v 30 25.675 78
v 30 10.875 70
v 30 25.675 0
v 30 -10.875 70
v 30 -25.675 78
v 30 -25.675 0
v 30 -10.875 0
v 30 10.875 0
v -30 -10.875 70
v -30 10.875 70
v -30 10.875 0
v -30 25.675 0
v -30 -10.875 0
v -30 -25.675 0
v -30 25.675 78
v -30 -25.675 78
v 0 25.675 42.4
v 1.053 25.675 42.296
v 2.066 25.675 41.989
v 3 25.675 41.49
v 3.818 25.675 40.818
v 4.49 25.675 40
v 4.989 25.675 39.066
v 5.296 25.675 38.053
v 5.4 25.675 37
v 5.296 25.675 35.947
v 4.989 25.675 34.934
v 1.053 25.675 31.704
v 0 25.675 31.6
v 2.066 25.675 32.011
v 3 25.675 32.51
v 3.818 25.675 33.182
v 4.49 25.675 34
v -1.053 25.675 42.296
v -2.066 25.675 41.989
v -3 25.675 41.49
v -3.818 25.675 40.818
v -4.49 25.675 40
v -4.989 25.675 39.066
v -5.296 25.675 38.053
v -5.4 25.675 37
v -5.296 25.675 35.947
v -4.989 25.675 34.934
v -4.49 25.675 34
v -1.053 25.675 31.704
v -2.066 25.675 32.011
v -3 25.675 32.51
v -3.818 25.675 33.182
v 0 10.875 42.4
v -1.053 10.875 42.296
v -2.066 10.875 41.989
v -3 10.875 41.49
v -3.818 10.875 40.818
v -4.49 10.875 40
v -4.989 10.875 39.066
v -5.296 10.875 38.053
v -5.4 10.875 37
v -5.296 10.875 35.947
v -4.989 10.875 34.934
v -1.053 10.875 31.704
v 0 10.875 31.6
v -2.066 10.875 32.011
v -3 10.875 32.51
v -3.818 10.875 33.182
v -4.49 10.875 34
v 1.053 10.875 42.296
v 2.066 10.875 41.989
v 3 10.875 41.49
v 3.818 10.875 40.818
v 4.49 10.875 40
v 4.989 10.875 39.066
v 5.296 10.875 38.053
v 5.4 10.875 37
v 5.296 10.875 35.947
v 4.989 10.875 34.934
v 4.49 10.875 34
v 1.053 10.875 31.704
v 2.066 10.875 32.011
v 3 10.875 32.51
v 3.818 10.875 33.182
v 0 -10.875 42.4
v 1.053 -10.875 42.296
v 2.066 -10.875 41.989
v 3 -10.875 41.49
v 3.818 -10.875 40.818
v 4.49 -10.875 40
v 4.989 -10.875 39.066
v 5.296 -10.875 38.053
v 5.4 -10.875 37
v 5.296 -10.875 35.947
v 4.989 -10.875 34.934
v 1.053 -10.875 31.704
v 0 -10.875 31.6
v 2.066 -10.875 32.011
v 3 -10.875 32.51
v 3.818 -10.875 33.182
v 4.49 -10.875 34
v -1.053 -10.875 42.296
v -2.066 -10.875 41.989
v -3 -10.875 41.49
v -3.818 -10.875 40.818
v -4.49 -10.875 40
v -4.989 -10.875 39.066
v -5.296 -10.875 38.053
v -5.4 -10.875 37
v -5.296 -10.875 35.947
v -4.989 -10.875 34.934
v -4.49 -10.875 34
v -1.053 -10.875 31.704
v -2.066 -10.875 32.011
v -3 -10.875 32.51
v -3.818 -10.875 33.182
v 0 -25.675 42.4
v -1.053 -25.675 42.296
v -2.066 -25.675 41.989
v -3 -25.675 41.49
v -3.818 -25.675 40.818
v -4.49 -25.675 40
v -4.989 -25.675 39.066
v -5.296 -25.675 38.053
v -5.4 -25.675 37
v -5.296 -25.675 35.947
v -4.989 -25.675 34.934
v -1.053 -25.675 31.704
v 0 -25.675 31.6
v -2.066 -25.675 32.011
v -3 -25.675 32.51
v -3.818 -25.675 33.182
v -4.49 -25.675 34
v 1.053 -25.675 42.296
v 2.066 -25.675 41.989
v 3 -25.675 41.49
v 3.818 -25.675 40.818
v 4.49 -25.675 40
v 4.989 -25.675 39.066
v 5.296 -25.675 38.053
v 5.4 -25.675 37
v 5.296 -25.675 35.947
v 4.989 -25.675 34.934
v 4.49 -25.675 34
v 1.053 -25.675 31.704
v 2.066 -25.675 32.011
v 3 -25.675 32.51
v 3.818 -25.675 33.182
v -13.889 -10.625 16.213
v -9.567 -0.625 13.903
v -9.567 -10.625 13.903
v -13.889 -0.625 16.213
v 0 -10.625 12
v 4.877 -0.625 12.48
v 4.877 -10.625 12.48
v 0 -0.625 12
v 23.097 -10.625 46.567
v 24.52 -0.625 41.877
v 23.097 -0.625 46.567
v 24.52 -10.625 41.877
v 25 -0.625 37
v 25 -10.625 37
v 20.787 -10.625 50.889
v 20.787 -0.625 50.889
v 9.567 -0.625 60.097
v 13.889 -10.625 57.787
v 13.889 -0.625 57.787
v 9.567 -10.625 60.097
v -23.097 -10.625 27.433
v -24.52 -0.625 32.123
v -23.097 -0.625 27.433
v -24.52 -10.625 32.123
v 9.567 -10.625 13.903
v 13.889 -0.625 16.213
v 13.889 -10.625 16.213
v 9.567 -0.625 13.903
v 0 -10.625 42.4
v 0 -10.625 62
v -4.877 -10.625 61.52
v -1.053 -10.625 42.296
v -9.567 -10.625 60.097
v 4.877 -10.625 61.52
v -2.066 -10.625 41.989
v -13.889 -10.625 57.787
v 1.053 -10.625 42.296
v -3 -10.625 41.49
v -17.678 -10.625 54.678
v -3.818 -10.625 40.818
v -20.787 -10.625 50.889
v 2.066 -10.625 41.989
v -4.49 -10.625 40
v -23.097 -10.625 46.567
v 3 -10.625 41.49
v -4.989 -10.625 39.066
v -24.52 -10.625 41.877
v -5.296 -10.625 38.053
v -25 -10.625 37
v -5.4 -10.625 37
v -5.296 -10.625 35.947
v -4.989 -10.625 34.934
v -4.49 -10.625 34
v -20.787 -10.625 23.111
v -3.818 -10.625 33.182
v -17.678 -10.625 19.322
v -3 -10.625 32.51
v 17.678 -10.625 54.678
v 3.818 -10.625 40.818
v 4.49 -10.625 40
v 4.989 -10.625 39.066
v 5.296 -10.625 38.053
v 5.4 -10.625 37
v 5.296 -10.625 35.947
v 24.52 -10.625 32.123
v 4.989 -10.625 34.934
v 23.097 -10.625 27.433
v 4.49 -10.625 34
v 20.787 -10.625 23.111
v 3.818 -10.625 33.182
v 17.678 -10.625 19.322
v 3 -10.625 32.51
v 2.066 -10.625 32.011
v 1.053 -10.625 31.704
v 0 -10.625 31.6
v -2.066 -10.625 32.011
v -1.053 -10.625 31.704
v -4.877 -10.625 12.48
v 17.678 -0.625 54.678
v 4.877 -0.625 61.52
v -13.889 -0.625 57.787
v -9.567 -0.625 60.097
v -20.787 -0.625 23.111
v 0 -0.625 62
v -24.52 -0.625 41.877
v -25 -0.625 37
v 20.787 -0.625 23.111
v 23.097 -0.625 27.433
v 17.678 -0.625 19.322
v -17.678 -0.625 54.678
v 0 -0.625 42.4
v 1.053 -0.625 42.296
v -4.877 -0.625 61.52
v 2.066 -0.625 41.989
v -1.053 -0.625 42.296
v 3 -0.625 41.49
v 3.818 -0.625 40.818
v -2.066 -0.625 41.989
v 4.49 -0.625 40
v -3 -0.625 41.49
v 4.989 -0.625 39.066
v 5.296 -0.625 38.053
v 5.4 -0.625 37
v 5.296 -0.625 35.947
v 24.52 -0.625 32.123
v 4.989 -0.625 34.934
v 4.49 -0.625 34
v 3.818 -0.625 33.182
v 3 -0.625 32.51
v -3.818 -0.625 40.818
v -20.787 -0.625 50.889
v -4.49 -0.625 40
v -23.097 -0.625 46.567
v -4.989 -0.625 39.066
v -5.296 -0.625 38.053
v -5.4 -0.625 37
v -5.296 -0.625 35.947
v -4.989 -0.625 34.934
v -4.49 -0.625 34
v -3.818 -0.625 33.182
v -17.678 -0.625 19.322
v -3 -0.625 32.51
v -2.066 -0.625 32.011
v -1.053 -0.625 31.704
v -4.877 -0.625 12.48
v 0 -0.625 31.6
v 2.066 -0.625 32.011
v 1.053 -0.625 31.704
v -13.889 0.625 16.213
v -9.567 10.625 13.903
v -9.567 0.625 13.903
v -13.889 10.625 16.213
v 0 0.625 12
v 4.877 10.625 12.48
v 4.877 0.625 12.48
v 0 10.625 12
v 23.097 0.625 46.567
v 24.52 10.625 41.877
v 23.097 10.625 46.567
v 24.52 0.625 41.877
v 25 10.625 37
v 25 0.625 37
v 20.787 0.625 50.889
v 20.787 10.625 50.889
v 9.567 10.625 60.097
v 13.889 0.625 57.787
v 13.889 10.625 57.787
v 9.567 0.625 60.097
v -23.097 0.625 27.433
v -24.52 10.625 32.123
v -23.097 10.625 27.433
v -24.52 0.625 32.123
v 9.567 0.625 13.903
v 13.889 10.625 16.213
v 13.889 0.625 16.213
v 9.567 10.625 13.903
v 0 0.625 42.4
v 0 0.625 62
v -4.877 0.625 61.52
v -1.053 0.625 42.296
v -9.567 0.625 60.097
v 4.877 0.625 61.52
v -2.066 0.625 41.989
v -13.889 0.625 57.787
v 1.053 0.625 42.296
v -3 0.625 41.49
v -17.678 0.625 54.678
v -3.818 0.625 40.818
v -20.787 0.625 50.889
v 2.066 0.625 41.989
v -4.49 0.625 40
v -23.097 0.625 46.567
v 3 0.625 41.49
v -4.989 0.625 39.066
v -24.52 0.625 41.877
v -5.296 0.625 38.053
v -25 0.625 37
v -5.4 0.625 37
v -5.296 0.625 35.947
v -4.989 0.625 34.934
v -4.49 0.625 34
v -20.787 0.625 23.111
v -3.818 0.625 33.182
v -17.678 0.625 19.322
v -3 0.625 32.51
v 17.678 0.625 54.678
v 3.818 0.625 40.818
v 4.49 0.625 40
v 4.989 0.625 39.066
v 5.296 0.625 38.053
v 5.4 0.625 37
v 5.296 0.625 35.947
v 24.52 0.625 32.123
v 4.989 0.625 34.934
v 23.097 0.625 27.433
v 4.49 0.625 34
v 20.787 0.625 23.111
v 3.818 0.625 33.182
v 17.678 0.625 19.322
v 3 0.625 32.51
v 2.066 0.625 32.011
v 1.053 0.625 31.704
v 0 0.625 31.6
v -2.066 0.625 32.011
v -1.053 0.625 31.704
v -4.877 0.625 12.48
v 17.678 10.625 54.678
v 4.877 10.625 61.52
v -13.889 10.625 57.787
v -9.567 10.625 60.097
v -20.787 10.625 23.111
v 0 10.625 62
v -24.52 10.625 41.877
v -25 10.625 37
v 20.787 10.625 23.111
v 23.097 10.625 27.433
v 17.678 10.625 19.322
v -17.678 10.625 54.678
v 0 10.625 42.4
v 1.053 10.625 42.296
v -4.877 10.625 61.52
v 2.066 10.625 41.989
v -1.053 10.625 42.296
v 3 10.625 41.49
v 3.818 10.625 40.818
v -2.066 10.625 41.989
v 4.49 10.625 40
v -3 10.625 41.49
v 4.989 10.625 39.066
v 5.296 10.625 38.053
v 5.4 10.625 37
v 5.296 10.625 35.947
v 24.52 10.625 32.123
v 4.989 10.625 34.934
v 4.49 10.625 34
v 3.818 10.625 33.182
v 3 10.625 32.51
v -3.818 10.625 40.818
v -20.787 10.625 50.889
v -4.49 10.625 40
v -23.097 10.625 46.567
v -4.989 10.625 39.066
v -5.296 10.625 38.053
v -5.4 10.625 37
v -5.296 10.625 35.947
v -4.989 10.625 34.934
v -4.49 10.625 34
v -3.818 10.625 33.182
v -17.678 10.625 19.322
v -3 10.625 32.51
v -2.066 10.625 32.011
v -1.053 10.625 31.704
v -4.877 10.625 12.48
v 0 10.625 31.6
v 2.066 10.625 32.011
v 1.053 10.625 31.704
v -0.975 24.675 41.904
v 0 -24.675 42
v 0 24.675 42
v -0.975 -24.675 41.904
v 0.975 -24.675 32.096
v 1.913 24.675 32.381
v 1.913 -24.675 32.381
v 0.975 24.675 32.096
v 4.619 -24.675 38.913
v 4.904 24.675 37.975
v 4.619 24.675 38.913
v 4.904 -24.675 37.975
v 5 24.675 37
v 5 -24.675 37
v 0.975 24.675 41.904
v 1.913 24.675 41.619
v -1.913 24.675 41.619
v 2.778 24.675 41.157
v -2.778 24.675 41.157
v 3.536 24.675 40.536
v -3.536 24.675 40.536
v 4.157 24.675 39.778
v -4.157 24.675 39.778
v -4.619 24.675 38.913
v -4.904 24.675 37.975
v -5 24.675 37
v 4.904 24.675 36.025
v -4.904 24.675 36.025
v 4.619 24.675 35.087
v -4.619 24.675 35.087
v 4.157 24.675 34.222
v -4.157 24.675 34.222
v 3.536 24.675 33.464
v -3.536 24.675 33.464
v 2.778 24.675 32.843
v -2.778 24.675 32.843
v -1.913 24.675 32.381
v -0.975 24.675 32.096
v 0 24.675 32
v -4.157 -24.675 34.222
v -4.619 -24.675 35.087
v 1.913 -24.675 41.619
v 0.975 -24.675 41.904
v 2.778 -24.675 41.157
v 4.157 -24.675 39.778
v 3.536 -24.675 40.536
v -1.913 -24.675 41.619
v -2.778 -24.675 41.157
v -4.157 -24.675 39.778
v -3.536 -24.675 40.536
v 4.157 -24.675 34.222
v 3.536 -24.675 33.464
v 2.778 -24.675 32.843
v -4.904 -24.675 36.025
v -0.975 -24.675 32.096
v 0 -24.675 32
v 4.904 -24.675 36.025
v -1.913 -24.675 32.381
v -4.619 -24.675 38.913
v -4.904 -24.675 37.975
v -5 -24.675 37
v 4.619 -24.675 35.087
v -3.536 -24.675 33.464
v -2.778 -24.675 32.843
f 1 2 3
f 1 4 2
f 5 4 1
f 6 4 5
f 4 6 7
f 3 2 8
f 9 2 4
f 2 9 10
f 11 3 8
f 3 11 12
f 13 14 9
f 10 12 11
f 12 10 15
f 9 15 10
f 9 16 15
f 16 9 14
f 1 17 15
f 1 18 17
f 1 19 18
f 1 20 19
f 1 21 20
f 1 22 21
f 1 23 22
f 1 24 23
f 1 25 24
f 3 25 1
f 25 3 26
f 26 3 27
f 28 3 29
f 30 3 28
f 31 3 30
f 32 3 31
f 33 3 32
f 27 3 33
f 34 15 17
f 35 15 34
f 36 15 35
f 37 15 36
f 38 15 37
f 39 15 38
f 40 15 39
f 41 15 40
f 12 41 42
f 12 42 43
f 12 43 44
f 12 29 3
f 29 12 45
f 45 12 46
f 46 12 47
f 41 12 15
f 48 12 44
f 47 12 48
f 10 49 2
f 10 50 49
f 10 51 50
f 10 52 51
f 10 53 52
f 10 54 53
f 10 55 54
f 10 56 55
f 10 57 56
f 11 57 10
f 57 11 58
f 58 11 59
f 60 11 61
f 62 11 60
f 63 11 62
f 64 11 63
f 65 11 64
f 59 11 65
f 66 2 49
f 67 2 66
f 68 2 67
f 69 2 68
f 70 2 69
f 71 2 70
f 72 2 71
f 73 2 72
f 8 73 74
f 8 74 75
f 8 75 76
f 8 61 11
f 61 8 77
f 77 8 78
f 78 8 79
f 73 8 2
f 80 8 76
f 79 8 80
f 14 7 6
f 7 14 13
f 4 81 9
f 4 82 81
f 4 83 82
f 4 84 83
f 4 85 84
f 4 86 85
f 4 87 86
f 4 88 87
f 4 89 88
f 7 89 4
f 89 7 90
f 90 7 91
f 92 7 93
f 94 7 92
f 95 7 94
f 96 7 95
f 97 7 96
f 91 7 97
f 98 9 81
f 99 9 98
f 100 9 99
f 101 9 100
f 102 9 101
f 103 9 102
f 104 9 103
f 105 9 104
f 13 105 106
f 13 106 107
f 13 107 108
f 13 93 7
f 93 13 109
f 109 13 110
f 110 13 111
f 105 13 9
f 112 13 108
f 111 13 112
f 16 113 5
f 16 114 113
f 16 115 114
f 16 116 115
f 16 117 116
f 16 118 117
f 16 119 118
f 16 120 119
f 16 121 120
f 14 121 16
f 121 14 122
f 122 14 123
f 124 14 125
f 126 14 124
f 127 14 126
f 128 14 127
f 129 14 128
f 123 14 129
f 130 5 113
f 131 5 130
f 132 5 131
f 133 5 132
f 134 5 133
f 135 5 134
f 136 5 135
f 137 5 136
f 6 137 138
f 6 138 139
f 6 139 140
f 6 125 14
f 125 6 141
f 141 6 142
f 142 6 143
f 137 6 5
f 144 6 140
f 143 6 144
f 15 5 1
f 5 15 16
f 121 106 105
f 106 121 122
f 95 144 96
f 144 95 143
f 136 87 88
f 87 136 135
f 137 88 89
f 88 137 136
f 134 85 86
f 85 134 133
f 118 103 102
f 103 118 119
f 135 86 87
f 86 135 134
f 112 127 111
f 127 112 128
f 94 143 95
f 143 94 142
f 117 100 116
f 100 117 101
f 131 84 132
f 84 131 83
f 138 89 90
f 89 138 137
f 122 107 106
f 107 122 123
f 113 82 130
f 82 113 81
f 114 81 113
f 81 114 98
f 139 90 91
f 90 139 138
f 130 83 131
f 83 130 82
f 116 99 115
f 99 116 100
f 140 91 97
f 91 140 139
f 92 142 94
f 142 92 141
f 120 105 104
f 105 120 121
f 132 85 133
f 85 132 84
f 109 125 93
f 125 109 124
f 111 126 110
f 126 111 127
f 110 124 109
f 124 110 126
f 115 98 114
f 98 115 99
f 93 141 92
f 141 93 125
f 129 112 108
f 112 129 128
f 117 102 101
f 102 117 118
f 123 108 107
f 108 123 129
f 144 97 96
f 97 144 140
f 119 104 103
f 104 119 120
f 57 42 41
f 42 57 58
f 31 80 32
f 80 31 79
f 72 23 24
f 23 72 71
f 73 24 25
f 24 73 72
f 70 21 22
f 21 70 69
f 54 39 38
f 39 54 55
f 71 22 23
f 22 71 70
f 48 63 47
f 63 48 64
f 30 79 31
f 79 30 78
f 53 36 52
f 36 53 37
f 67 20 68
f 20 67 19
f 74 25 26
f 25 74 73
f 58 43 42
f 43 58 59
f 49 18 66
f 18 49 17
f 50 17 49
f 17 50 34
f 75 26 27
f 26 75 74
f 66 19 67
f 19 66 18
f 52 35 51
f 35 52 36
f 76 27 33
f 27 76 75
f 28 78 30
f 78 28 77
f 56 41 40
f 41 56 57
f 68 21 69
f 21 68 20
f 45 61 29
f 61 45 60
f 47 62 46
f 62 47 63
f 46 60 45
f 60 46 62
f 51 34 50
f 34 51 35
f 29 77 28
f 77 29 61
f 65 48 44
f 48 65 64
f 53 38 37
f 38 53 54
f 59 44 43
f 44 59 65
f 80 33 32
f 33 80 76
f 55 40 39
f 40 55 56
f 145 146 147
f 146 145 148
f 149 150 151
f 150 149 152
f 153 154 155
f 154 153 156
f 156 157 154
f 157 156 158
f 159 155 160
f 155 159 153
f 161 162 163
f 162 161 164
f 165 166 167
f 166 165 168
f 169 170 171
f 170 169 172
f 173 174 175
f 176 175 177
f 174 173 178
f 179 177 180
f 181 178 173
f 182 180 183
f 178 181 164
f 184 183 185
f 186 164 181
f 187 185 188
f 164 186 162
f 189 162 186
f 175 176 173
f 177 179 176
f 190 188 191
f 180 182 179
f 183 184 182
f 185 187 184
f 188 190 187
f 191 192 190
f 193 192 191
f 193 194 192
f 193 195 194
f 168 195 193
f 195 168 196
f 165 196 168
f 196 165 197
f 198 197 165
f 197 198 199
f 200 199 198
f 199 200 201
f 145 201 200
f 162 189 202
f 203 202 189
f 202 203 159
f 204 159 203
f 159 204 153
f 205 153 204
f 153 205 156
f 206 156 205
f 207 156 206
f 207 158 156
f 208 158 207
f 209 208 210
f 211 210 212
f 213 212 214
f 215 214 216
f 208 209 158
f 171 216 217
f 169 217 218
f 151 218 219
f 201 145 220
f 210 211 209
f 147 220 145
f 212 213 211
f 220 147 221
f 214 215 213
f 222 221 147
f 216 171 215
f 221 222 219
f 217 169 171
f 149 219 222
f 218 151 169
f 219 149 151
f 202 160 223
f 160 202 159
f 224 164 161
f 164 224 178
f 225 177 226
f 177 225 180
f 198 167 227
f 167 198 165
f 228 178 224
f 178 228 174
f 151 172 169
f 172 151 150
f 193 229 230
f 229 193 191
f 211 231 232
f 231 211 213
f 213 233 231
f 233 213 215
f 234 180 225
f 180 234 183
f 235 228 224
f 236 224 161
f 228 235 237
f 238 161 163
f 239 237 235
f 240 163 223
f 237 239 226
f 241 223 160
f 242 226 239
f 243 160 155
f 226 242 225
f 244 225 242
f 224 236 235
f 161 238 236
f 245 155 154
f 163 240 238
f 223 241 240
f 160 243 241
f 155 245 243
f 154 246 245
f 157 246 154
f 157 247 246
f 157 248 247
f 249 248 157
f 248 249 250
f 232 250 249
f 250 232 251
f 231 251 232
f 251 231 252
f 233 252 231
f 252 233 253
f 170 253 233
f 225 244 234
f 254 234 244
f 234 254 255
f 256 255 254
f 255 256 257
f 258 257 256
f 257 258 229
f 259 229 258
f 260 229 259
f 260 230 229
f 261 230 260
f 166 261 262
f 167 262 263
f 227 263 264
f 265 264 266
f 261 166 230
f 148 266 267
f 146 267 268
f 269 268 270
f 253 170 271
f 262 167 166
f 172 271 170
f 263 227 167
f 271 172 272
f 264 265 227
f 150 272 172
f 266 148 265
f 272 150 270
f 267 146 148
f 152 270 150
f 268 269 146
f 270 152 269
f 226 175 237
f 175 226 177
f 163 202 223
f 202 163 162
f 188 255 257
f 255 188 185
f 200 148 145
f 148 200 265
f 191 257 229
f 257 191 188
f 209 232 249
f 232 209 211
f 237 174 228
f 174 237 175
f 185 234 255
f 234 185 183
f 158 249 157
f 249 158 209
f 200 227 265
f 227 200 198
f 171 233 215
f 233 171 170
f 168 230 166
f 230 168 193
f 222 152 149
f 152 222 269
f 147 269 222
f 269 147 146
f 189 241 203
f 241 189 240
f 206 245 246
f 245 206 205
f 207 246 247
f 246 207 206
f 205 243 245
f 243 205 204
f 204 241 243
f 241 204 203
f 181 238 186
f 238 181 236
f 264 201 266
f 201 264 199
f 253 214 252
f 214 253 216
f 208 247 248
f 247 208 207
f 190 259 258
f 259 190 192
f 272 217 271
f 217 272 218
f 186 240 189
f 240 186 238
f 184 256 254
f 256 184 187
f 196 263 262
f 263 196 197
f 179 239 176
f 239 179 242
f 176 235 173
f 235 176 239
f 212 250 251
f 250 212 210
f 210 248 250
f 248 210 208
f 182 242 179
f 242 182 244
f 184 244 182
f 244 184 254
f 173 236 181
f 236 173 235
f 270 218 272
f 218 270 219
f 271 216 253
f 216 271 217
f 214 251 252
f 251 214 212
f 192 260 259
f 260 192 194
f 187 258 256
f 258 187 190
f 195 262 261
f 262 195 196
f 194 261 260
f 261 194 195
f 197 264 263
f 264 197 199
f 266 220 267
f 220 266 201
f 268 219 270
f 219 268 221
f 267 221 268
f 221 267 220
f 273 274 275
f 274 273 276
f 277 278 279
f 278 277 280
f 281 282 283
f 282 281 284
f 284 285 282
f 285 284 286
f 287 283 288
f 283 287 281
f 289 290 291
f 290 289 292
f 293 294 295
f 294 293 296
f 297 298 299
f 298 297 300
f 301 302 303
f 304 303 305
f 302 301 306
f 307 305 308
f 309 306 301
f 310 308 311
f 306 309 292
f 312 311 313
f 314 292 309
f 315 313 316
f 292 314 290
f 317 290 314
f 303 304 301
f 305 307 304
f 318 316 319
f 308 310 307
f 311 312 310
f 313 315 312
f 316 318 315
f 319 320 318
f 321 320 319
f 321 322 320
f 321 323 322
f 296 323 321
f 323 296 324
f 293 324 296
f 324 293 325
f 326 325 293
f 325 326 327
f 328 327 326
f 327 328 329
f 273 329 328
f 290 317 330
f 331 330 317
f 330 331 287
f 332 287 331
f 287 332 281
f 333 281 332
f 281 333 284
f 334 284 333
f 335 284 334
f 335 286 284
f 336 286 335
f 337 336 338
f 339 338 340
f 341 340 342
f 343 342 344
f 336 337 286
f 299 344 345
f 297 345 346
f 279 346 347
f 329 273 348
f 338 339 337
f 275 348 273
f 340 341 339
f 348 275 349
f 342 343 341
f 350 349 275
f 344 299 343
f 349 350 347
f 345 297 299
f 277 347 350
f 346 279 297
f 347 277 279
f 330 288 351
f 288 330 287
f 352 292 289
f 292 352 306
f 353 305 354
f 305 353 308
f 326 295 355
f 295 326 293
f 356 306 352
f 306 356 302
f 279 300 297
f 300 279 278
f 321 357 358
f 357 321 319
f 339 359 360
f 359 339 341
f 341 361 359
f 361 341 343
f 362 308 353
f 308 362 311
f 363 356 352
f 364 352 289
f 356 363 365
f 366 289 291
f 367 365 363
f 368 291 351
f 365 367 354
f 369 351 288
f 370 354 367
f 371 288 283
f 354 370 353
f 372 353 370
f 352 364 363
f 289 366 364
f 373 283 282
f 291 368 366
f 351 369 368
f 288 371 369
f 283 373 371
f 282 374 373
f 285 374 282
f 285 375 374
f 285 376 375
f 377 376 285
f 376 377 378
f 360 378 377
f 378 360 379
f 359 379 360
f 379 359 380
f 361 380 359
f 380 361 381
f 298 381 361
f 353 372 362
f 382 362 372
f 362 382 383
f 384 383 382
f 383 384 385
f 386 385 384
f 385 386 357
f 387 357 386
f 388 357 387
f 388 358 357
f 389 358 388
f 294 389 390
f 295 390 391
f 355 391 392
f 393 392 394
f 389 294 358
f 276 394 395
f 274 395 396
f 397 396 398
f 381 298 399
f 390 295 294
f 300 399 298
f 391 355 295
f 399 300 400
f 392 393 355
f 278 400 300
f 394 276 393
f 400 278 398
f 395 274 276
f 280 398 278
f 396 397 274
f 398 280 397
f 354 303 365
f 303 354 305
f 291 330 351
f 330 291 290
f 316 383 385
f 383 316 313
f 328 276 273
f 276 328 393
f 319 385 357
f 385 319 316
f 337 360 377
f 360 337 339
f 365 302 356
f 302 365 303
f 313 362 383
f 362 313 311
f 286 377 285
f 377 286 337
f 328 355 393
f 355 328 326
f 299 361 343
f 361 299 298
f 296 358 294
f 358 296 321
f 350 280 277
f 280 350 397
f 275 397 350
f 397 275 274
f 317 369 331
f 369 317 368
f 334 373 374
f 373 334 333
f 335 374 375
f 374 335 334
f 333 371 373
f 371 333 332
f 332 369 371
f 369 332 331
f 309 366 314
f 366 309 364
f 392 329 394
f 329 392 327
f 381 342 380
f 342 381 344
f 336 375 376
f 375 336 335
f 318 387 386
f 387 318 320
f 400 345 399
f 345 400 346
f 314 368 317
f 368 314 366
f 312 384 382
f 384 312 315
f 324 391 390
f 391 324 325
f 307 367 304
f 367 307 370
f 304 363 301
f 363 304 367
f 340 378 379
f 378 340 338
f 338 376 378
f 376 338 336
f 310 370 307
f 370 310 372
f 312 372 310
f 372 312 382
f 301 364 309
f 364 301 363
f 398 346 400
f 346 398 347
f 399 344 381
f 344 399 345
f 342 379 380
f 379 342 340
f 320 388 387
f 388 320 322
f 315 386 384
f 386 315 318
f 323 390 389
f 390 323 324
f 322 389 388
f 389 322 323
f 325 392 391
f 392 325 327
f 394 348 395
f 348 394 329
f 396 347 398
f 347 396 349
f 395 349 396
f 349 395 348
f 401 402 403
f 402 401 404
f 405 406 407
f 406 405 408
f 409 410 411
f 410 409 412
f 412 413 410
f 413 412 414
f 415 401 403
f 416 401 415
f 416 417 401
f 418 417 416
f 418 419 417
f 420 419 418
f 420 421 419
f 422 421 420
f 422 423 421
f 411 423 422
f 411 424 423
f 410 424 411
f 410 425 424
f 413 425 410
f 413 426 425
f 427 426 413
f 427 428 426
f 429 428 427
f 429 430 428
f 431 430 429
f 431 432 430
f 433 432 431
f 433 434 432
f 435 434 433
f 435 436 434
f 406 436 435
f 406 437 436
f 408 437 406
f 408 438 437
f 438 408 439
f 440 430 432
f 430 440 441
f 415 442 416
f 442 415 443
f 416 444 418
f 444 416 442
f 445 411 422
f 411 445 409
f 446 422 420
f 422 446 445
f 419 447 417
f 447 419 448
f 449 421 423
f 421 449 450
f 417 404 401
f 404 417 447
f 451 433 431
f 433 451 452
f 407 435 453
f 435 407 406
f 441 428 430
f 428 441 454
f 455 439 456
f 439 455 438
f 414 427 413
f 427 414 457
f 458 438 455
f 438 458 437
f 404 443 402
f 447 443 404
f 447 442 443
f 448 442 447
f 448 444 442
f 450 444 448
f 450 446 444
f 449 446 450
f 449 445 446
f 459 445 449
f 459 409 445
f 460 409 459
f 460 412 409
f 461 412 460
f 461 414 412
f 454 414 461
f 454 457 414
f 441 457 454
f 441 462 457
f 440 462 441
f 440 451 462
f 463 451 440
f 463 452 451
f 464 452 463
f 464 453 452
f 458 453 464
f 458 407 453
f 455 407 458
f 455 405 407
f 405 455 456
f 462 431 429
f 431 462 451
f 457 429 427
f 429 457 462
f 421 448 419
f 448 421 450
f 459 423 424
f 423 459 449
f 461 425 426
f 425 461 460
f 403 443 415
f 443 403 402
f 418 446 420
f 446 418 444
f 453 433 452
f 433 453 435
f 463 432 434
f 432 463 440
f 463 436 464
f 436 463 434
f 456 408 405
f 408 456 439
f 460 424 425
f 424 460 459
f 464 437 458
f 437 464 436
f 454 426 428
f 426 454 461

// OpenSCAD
$fn = 32;

// ------------------------------------------------------------------------
// Trolley wheel set: wheels d50, fork 70 mm tall
// Every part is its own module, assembly() places every instance.
// ------------------------------------------------------------------------

// --- part 1 ---
module trolley_fork() {
  difference() {
    union() {
      translate([-30, 10.875, 0]) cube([60, 14.8, 70]);
      translate([-30, -25.675, 0]) cube([60, 14.8, 70]);
      translate([-30, -25.675, 70]) cube([60, 51.35, 8]);
    }
    translate([0, -18.275, 37]) rotate([90, 0, 0]) cylinder(h = 16.8, d = 10.8, center = true);
    translate([0, 18.275, 37]) rotate([90, 0, 0]) cylinder(h = 16.8, d = 10.8, center = true);
  }
}

// --- part 2 ---
module trolley_wheel() {
  difference() {
      translate([0, 0, 0]) cylinder(h = 10, d = 50);
      translate([0, 0, -1]) cylinder(h = 12, d = 10.8);
    }
}

// --- part 3 ---
module trolley_axle() {
  translate([0, 0, -24.675]) cylinder(h = 49.35, d = 10);
}

// --- assembly ---
module assembly() {
  color([0.80, 0.24, 0.20]) translate([0, 0, 0]) rotate([0, 0, 0]) trolley_fork();
  color([0.20, 0.45, 0.75]) translate([0, -0.625, 37]) rotate([90, 0, 0]) trolley_wheel();
  color([0.25, 0.62, 0.32]) translate([0, 10.625, 37]) rotate([90, 0, 0]) trolley_wheel();
  color([0.92, 0.70, 0.18]) translate([0, 0, 37]) rotate([90, 0, 0]) trolley_axle();
}

assembly();
